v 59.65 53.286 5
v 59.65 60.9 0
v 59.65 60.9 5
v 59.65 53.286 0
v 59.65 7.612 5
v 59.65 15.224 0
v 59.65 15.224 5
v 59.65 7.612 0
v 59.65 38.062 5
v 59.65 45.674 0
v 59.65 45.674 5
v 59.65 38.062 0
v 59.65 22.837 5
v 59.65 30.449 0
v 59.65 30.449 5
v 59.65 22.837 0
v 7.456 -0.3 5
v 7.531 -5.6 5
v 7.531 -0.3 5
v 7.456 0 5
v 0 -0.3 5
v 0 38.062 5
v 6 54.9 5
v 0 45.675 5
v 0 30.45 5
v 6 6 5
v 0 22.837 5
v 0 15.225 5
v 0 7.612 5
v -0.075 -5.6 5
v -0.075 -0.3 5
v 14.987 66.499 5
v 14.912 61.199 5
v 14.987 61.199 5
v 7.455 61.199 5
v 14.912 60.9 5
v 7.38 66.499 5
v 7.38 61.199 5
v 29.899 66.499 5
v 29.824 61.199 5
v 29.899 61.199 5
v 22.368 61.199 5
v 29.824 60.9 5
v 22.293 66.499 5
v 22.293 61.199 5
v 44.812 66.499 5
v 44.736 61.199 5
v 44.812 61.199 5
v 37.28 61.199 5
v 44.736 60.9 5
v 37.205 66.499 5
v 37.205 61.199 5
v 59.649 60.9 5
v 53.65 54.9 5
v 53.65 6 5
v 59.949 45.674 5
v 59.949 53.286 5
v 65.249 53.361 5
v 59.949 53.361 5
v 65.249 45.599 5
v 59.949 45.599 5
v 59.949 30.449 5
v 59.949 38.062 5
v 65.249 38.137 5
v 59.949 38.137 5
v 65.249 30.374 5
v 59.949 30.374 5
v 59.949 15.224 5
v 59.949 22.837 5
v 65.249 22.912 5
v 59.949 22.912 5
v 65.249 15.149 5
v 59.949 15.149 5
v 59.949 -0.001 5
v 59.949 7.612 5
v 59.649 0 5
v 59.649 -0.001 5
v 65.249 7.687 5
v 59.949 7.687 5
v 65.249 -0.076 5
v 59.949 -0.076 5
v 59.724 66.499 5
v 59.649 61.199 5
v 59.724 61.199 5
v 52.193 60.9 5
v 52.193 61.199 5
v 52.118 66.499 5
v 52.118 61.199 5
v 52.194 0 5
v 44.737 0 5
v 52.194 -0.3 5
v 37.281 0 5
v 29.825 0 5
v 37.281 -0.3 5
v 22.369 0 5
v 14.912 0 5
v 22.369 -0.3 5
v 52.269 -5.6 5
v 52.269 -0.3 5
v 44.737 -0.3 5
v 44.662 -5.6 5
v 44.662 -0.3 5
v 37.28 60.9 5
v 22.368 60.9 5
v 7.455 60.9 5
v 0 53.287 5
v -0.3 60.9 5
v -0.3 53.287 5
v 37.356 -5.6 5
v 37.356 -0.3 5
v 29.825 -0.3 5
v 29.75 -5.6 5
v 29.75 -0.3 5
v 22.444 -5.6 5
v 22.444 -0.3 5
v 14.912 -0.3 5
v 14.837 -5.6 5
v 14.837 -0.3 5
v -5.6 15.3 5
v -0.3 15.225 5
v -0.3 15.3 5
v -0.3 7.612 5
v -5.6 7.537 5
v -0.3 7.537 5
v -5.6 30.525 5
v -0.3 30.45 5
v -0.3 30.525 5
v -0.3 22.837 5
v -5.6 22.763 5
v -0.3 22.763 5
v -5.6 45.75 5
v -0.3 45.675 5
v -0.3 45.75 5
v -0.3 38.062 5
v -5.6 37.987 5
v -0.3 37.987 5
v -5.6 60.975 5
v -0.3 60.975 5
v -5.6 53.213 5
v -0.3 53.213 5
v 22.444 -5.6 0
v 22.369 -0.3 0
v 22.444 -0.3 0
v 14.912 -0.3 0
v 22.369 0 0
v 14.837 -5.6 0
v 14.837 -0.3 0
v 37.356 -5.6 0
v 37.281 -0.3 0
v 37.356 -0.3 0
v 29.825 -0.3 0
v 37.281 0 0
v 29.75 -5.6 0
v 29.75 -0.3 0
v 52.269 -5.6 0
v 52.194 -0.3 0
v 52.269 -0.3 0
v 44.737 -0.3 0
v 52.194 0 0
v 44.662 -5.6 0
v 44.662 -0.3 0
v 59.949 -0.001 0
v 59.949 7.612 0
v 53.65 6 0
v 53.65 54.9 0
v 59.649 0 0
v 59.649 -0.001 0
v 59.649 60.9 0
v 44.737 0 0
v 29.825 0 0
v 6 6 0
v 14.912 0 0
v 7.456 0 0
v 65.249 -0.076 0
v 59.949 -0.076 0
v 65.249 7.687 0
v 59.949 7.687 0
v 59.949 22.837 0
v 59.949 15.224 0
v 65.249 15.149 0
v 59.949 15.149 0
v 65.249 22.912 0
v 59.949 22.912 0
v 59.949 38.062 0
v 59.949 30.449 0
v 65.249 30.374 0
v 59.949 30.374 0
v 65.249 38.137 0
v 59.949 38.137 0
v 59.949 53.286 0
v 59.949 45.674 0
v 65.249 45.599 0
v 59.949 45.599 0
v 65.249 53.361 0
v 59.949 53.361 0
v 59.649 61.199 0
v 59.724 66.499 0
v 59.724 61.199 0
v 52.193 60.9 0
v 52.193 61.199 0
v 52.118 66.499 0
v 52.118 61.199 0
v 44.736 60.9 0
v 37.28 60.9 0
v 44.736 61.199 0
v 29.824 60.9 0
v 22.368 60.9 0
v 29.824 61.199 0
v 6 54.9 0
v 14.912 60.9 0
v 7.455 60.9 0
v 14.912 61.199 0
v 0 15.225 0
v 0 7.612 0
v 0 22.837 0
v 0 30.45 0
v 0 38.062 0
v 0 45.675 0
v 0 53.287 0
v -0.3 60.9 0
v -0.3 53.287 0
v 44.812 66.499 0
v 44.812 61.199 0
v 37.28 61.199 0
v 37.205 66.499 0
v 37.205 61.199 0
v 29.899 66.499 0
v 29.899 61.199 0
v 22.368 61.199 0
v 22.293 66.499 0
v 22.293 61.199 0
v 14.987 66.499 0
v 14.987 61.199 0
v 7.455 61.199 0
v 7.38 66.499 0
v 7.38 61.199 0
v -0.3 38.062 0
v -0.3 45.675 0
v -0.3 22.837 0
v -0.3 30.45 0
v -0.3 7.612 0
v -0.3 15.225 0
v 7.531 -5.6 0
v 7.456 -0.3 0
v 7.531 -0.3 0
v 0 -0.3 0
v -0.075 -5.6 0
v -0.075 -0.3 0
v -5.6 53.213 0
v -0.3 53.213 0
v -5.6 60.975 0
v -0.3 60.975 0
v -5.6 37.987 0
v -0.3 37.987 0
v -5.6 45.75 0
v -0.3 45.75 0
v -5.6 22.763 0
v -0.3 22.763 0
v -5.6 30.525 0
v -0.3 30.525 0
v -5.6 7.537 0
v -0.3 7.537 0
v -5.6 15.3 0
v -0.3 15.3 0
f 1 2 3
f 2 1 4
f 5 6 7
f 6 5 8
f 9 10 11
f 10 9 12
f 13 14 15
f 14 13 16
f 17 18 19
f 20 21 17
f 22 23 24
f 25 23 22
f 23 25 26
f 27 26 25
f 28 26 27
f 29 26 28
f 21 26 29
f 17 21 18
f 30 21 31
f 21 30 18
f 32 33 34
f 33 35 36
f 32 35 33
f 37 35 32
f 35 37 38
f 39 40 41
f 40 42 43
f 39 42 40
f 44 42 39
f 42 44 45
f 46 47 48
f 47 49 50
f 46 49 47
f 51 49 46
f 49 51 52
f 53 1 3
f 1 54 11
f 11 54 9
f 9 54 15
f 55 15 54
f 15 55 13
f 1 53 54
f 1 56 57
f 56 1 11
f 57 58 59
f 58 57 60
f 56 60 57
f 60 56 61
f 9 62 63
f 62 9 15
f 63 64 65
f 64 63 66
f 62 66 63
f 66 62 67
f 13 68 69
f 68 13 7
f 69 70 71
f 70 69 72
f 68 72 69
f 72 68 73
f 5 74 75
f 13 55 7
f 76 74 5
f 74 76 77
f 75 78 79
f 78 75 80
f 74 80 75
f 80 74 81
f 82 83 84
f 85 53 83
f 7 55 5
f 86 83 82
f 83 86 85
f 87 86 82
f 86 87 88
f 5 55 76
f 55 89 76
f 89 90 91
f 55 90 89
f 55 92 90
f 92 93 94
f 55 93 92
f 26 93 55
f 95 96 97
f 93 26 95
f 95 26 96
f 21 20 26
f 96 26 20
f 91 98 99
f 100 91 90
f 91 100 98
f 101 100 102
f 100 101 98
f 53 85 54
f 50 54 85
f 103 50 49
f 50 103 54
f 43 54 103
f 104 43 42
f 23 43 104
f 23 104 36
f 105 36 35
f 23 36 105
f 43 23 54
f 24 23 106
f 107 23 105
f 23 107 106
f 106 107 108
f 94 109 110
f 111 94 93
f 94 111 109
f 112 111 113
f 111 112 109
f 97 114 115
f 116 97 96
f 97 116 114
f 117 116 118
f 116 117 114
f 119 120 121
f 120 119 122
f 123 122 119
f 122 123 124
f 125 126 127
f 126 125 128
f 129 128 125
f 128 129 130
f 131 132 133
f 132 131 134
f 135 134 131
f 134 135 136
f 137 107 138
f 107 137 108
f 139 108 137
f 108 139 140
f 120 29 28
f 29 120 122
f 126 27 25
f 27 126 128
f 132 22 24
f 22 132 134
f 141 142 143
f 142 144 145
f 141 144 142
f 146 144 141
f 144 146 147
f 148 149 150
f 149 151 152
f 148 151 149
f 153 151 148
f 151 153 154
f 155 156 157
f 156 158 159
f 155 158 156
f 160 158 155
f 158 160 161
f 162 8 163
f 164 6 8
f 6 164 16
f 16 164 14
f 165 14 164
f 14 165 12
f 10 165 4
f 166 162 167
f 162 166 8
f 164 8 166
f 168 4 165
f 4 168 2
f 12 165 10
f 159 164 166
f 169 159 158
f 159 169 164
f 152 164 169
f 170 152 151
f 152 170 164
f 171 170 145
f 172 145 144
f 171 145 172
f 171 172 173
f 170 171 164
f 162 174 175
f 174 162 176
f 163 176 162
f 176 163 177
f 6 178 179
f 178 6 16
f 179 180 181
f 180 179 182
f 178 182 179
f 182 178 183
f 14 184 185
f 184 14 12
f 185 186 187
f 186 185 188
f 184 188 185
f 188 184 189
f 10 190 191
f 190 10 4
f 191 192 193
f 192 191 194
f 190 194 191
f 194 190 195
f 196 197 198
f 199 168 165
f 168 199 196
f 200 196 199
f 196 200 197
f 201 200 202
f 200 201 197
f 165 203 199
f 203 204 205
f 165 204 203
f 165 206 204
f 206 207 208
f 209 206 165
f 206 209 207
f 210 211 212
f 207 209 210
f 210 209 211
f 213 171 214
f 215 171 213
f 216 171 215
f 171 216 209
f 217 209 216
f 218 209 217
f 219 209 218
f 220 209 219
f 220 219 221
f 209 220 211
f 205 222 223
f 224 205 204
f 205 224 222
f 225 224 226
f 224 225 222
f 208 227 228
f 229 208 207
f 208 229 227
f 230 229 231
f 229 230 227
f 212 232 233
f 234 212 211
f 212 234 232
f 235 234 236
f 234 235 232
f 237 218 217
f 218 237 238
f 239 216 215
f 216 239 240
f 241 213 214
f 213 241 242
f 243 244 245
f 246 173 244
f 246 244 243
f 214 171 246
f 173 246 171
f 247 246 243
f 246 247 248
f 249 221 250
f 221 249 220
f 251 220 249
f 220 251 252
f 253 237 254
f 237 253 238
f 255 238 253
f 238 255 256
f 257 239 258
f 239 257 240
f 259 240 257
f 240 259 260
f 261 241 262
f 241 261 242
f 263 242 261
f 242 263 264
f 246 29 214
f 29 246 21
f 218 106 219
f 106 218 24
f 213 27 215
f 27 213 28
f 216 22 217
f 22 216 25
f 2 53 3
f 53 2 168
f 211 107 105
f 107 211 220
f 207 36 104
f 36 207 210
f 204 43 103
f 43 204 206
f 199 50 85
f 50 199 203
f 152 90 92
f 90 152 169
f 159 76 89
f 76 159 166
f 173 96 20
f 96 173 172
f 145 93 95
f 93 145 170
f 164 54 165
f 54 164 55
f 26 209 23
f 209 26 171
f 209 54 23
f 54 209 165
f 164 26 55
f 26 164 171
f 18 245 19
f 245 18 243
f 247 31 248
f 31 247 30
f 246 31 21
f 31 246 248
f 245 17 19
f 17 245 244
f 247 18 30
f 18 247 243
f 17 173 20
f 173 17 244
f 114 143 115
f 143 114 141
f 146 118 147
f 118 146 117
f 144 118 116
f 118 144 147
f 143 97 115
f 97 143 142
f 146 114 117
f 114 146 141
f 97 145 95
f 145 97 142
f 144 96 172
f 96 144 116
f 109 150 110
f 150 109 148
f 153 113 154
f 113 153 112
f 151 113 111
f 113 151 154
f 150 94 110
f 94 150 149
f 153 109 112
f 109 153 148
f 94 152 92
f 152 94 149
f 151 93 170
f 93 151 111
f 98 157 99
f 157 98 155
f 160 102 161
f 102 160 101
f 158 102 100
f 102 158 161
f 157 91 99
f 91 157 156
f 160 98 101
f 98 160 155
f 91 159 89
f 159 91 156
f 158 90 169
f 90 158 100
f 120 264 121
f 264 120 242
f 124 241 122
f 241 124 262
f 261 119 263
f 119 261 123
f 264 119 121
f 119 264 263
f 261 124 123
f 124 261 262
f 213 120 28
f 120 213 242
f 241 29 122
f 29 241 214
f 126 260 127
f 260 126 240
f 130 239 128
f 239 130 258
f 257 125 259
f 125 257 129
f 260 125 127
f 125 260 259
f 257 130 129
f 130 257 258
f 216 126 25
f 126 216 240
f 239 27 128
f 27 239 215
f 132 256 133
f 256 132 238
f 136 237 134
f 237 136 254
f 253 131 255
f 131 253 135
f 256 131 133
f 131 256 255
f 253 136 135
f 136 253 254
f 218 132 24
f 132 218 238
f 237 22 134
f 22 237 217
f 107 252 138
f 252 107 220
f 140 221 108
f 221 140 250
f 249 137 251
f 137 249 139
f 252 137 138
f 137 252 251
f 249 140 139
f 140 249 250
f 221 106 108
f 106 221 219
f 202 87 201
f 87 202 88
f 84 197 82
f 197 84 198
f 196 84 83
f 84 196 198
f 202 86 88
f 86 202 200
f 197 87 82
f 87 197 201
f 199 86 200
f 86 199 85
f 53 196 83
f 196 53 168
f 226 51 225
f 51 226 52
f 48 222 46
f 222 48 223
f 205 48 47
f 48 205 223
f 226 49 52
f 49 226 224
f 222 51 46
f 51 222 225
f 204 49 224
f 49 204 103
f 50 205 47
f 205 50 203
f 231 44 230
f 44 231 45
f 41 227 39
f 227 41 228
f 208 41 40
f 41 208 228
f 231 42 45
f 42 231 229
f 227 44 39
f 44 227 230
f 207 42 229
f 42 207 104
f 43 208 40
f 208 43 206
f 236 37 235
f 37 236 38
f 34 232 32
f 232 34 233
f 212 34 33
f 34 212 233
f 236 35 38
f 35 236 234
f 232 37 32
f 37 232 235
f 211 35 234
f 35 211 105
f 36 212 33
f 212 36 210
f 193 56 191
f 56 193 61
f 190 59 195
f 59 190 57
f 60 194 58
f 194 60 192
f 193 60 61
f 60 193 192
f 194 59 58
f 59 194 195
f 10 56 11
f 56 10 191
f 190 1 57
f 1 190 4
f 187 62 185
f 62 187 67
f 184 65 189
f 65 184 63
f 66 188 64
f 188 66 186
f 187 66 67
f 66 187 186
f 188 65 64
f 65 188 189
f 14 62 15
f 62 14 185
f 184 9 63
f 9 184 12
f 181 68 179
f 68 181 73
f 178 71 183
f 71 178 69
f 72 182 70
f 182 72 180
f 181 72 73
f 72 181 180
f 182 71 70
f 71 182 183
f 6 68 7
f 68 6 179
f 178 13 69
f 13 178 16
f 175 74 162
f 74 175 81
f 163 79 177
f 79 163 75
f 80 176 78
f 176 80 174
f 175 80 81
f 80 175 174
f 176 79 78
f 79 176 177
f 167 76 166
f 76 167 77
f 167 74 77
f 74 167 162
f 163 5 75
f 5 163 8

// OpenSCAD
cube_size = [65.25,66.5,5];

//cube_size = [20,20,5];

thickness = 6;
gap_width = -0.15;
gap_depth = 0.3;
clip_depth = 5;
teeth_amount = 4;

clip_depth_ = clip_depth+gap_depth;
size = [cube_size[0]-clip_depth_-gap_depth,cube_size[1]-clip_depth_-gap_depth,cube_size[2]];
clip_width_x = (size[0]/teeth_amount)/2;
clip_width_y = (size[1]/teeth_amount)/2;




module teeth () {
    for(clip = [0:clip_width_x*2:size[0]-0.1]) { 
        translate([clip+gap_width/2,-clip_depth_-gap_depth,0]) cube([clip_width_x-gap_width, clip_depth_, size[2]]);
        translate([clip,-gap_depth,0]) cube([clip_width_x, gap_depth, size[2]]);
    }
    for(clip = [clip_width_y:clip_width_y*2:size[0]-0.1]) {
        translate([-clip_depth_-gap_depth,clip+gap_width/2,0]) cube([clip_depth_, clip_width_y-gap_width, size[2]]);
        translate([-gap_depth,clip,0]) cube([gap_depth, clip_width_y, size[2]]);
    }
}
difference() {
    cube(size);
    translate([size[0]/2,size[1]/2,size[2]/2]) cube([size[0]-thickness*2,size[1]-thickness*2,size[2]], center=true);
  }
teeth();
translate([size[0]-0.001, size[1]-0.001,0]) rotate([0,0,180]) teeth();
